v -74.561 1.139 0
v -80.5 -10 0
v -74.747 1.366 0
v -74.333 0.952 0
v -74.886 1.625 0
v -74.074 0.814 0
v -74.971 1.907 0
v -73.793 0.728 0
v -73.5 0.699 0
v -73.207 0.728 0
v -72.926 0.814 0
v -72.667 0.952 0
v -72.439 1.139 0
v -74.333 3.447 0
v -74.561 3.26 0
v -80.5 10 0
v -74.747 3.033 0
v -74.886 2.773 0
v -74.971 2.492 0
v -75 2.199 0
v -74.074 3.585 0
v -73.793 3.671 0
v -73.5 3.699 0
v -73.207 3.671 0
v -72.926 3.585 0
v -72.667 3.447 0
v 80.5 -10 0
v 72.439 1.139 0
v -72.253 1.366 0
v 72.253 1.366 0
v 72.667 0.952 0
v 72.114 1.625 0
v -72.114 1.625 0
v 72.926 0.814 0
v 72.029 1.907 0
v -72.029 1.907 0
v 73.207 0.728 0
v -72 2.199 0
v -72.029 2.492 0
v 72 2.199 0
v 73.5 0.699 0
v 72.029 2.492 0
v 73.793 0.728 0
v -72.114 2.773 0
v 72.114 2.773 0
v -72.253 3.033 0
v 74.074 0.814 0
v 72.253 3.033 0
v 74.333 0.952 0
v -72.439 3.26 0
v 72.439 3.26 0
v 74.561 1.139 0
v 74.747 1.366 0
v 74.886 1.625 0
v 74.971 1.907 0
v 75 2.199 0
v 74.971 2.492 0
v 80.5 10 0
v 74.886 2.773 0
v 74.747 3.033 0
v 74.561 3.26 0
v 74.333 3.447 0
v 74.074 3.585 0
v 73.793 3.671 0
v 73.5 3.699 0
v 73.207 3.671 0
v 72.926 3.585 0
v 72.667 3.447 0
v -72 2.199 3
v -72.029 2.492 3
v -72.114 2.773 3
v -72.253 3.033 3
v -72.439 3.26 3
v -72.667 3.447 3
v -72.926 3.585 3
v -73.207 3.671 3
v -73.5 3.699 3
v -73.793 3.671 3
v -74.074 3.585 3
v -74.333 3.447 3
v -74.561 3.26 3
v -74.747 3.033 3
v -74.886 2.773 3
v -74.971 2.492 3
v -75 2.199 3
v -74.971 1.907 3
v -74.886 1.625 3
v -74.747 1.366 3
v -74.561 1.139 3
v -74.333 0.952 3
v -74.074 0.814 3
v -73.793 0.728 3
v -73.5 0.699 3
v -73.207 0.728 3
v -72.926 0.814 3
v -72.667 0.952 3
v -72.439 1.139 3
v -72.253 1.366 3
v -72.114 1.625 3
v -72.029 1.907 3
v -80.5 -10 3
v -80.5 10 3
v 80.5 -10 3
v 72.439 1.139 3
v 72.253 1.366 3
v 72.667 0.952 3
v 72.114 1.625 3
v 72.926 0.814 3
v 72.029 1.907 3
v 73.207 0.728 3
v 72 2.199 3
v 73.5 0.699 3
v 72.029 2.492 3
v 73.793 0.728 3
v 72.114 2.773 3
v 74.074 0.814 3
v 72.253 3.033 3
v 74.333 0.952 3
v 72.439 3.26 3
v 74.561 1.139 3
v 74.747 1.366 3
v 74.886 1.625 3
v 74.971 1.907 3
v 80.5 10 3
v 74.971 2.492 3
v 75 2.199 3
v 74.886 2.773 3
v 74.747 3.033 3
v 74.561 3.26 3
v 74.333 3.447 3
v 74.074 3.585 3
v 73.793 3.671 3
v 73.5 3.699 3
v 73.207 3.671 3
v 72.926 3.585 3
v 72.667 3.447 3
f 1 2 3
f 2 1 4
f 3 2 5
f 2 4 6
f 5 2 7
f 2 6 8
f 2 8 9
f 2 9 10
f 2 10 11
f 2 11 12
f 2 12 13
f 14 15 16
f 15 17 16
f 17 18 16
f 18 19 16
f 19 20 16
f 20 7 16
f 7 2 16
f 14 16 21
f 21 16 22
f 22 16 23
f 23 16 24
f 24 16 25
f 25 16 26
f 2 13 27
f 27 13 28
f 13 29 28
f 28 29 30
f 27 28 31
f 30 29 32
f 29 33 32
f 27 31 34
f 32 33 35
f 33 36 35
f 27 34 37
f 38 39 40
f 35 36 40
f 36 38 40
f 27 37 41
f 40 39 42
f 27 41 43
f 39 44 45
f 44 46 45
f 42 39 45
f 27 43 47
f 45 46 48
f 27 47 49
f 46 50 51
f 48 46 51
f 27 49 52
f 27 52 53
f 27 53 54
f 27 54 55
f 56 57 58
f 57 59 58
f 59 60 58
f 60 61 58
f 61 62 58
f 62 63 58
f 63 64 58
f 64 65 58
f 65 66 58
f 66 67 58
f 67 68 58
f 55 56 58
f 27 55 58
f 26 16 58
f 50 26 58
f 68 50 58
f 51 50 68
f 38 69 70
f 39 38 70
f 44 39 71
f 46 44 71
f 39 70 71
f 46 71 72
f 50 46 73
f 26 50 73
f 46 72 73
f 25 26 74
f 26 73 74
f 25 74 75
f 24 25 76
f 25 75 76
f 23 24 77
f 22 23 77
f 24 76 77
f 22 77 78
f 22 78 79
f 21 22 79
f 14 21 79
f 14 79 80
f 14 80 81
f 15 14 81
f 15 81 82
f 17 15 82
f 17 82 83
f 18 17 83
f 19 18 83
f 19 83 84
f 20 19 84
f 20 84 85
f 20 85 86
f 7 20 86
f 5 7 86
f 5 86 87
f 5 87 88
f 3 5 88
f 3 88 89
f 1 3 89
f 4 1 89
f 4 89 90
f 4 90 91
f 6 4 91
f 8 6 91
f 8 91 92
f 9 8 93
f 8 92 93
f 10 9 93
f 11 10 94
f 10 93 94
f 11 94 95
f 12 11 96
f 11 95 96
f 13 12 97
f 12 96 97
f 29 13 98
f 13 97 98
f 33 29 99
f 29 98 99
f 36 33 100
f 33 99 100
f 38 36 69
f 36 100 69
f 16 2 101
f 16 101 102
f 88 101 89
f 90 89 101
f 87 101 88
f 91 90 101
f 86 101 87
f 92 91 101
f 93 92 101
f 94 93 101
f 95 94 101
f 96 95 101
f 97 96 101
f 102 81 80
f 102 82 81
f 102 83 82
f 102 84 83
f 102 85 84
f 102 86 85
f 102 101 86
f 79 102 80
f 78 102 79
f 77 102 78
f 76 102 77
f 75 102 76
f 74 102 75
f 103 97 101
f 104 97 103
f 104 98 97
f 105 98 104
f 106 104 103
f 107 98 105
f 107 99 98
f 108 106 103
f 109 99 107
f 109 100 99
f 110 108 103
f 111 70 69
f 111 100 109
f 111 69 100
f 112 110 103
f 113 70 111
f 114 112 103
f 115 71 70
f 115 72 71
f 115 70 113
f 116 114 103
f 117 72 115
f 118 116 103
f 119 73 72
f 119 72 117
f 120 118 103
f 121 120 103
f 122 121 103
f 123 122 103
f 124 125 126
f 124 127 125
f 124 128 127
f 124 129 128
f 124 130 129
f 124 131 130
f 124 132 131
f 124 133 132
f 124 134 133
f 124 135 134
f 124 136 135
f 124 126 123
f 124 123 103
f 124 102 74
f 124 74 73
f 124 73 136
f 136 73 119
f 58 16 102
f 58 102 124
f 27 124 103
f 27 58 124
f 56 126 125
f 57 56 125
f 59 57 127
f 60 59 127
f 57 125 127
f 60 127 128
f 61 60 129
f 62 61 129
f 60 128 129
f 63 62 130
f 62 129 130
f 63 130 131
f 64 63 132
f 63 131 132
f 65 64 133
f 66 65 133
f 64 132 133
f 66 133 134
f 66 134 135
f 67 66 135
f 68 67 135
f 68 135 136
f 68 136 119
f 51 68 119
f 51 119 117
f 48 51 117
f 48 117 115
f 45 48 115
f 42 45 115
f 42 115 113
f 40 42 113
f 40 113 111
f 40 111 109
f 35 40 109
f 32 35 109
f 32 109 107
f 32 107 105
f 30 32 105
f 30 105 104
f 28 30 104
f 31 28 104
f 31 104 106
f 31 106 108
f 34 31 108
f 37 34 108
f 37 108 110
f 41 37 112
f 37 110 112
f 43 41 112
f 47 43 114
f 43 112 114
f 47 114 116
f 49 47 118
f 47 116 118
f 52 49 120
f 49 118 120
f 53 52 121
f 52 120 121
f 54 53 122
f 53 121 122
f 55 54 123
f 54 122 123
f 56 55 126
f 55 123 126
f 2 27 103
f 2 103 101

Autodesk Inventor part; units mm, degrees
ref_plane "YZ Plane" through (0, 0, 0) normal (1, 0, 0) x (0, 1, 0)
ref_plane "XZ Plane" through (0, 0, 0) normal (0, 1, 0) x (-1, 0, 0)
ref_plane "XY Plane" through (0, 0, 0) normal (0, 0, 1) x (1, 0, 0)
sketch "草图1" plane through (0, 0, 0) normal (0, 0, 1) x (1, 0, 0)
  line L0 (80.5, -10) -> (-80.5, -10)
  line L1 (-80.5, -10) -> (-80.5, 10)
  line L2 (-80.5, 10) -> (80.5, 10)
  line L3 (80.5, 10) -> (80.5, -10)
  line L4 (80.5, -10) -> (-80.5, 10) construction
  line L5 (-80.5, -10) -> (80.5, 10) construction
  point P0 (0, 0)
  dimension "d0" = 20
  dimension "d1" = 161
extrude "拉伸1" add sketch "草图1" along normal blind 3
sketch "草图2" plane through (0, 0, 3) normal (0, 0, 1) x (1, 0, 0)
  circle A0 centre (73.5, 2.1994) radius 1.5 projected
  line L0 (80.5, 10) -> (-80.5, 10) projected
  line L1 (80.5, -10) -> (80.5, 10) projected
  line L2 (-80.5, 10) -> (80.5, 10)
  line L3 (0, 10) -> (0, -10)
  line L4 (-80.5, -10) -> (80.5, -10) projected
  circle A1 centre (-73.5, 2.1994) radius 1.5
  point P0 (0, 0)
extrude "拉伸2" cut sketch "草图2" against normal blind 10 contours A0 | A1
properties part number "前挡板"
